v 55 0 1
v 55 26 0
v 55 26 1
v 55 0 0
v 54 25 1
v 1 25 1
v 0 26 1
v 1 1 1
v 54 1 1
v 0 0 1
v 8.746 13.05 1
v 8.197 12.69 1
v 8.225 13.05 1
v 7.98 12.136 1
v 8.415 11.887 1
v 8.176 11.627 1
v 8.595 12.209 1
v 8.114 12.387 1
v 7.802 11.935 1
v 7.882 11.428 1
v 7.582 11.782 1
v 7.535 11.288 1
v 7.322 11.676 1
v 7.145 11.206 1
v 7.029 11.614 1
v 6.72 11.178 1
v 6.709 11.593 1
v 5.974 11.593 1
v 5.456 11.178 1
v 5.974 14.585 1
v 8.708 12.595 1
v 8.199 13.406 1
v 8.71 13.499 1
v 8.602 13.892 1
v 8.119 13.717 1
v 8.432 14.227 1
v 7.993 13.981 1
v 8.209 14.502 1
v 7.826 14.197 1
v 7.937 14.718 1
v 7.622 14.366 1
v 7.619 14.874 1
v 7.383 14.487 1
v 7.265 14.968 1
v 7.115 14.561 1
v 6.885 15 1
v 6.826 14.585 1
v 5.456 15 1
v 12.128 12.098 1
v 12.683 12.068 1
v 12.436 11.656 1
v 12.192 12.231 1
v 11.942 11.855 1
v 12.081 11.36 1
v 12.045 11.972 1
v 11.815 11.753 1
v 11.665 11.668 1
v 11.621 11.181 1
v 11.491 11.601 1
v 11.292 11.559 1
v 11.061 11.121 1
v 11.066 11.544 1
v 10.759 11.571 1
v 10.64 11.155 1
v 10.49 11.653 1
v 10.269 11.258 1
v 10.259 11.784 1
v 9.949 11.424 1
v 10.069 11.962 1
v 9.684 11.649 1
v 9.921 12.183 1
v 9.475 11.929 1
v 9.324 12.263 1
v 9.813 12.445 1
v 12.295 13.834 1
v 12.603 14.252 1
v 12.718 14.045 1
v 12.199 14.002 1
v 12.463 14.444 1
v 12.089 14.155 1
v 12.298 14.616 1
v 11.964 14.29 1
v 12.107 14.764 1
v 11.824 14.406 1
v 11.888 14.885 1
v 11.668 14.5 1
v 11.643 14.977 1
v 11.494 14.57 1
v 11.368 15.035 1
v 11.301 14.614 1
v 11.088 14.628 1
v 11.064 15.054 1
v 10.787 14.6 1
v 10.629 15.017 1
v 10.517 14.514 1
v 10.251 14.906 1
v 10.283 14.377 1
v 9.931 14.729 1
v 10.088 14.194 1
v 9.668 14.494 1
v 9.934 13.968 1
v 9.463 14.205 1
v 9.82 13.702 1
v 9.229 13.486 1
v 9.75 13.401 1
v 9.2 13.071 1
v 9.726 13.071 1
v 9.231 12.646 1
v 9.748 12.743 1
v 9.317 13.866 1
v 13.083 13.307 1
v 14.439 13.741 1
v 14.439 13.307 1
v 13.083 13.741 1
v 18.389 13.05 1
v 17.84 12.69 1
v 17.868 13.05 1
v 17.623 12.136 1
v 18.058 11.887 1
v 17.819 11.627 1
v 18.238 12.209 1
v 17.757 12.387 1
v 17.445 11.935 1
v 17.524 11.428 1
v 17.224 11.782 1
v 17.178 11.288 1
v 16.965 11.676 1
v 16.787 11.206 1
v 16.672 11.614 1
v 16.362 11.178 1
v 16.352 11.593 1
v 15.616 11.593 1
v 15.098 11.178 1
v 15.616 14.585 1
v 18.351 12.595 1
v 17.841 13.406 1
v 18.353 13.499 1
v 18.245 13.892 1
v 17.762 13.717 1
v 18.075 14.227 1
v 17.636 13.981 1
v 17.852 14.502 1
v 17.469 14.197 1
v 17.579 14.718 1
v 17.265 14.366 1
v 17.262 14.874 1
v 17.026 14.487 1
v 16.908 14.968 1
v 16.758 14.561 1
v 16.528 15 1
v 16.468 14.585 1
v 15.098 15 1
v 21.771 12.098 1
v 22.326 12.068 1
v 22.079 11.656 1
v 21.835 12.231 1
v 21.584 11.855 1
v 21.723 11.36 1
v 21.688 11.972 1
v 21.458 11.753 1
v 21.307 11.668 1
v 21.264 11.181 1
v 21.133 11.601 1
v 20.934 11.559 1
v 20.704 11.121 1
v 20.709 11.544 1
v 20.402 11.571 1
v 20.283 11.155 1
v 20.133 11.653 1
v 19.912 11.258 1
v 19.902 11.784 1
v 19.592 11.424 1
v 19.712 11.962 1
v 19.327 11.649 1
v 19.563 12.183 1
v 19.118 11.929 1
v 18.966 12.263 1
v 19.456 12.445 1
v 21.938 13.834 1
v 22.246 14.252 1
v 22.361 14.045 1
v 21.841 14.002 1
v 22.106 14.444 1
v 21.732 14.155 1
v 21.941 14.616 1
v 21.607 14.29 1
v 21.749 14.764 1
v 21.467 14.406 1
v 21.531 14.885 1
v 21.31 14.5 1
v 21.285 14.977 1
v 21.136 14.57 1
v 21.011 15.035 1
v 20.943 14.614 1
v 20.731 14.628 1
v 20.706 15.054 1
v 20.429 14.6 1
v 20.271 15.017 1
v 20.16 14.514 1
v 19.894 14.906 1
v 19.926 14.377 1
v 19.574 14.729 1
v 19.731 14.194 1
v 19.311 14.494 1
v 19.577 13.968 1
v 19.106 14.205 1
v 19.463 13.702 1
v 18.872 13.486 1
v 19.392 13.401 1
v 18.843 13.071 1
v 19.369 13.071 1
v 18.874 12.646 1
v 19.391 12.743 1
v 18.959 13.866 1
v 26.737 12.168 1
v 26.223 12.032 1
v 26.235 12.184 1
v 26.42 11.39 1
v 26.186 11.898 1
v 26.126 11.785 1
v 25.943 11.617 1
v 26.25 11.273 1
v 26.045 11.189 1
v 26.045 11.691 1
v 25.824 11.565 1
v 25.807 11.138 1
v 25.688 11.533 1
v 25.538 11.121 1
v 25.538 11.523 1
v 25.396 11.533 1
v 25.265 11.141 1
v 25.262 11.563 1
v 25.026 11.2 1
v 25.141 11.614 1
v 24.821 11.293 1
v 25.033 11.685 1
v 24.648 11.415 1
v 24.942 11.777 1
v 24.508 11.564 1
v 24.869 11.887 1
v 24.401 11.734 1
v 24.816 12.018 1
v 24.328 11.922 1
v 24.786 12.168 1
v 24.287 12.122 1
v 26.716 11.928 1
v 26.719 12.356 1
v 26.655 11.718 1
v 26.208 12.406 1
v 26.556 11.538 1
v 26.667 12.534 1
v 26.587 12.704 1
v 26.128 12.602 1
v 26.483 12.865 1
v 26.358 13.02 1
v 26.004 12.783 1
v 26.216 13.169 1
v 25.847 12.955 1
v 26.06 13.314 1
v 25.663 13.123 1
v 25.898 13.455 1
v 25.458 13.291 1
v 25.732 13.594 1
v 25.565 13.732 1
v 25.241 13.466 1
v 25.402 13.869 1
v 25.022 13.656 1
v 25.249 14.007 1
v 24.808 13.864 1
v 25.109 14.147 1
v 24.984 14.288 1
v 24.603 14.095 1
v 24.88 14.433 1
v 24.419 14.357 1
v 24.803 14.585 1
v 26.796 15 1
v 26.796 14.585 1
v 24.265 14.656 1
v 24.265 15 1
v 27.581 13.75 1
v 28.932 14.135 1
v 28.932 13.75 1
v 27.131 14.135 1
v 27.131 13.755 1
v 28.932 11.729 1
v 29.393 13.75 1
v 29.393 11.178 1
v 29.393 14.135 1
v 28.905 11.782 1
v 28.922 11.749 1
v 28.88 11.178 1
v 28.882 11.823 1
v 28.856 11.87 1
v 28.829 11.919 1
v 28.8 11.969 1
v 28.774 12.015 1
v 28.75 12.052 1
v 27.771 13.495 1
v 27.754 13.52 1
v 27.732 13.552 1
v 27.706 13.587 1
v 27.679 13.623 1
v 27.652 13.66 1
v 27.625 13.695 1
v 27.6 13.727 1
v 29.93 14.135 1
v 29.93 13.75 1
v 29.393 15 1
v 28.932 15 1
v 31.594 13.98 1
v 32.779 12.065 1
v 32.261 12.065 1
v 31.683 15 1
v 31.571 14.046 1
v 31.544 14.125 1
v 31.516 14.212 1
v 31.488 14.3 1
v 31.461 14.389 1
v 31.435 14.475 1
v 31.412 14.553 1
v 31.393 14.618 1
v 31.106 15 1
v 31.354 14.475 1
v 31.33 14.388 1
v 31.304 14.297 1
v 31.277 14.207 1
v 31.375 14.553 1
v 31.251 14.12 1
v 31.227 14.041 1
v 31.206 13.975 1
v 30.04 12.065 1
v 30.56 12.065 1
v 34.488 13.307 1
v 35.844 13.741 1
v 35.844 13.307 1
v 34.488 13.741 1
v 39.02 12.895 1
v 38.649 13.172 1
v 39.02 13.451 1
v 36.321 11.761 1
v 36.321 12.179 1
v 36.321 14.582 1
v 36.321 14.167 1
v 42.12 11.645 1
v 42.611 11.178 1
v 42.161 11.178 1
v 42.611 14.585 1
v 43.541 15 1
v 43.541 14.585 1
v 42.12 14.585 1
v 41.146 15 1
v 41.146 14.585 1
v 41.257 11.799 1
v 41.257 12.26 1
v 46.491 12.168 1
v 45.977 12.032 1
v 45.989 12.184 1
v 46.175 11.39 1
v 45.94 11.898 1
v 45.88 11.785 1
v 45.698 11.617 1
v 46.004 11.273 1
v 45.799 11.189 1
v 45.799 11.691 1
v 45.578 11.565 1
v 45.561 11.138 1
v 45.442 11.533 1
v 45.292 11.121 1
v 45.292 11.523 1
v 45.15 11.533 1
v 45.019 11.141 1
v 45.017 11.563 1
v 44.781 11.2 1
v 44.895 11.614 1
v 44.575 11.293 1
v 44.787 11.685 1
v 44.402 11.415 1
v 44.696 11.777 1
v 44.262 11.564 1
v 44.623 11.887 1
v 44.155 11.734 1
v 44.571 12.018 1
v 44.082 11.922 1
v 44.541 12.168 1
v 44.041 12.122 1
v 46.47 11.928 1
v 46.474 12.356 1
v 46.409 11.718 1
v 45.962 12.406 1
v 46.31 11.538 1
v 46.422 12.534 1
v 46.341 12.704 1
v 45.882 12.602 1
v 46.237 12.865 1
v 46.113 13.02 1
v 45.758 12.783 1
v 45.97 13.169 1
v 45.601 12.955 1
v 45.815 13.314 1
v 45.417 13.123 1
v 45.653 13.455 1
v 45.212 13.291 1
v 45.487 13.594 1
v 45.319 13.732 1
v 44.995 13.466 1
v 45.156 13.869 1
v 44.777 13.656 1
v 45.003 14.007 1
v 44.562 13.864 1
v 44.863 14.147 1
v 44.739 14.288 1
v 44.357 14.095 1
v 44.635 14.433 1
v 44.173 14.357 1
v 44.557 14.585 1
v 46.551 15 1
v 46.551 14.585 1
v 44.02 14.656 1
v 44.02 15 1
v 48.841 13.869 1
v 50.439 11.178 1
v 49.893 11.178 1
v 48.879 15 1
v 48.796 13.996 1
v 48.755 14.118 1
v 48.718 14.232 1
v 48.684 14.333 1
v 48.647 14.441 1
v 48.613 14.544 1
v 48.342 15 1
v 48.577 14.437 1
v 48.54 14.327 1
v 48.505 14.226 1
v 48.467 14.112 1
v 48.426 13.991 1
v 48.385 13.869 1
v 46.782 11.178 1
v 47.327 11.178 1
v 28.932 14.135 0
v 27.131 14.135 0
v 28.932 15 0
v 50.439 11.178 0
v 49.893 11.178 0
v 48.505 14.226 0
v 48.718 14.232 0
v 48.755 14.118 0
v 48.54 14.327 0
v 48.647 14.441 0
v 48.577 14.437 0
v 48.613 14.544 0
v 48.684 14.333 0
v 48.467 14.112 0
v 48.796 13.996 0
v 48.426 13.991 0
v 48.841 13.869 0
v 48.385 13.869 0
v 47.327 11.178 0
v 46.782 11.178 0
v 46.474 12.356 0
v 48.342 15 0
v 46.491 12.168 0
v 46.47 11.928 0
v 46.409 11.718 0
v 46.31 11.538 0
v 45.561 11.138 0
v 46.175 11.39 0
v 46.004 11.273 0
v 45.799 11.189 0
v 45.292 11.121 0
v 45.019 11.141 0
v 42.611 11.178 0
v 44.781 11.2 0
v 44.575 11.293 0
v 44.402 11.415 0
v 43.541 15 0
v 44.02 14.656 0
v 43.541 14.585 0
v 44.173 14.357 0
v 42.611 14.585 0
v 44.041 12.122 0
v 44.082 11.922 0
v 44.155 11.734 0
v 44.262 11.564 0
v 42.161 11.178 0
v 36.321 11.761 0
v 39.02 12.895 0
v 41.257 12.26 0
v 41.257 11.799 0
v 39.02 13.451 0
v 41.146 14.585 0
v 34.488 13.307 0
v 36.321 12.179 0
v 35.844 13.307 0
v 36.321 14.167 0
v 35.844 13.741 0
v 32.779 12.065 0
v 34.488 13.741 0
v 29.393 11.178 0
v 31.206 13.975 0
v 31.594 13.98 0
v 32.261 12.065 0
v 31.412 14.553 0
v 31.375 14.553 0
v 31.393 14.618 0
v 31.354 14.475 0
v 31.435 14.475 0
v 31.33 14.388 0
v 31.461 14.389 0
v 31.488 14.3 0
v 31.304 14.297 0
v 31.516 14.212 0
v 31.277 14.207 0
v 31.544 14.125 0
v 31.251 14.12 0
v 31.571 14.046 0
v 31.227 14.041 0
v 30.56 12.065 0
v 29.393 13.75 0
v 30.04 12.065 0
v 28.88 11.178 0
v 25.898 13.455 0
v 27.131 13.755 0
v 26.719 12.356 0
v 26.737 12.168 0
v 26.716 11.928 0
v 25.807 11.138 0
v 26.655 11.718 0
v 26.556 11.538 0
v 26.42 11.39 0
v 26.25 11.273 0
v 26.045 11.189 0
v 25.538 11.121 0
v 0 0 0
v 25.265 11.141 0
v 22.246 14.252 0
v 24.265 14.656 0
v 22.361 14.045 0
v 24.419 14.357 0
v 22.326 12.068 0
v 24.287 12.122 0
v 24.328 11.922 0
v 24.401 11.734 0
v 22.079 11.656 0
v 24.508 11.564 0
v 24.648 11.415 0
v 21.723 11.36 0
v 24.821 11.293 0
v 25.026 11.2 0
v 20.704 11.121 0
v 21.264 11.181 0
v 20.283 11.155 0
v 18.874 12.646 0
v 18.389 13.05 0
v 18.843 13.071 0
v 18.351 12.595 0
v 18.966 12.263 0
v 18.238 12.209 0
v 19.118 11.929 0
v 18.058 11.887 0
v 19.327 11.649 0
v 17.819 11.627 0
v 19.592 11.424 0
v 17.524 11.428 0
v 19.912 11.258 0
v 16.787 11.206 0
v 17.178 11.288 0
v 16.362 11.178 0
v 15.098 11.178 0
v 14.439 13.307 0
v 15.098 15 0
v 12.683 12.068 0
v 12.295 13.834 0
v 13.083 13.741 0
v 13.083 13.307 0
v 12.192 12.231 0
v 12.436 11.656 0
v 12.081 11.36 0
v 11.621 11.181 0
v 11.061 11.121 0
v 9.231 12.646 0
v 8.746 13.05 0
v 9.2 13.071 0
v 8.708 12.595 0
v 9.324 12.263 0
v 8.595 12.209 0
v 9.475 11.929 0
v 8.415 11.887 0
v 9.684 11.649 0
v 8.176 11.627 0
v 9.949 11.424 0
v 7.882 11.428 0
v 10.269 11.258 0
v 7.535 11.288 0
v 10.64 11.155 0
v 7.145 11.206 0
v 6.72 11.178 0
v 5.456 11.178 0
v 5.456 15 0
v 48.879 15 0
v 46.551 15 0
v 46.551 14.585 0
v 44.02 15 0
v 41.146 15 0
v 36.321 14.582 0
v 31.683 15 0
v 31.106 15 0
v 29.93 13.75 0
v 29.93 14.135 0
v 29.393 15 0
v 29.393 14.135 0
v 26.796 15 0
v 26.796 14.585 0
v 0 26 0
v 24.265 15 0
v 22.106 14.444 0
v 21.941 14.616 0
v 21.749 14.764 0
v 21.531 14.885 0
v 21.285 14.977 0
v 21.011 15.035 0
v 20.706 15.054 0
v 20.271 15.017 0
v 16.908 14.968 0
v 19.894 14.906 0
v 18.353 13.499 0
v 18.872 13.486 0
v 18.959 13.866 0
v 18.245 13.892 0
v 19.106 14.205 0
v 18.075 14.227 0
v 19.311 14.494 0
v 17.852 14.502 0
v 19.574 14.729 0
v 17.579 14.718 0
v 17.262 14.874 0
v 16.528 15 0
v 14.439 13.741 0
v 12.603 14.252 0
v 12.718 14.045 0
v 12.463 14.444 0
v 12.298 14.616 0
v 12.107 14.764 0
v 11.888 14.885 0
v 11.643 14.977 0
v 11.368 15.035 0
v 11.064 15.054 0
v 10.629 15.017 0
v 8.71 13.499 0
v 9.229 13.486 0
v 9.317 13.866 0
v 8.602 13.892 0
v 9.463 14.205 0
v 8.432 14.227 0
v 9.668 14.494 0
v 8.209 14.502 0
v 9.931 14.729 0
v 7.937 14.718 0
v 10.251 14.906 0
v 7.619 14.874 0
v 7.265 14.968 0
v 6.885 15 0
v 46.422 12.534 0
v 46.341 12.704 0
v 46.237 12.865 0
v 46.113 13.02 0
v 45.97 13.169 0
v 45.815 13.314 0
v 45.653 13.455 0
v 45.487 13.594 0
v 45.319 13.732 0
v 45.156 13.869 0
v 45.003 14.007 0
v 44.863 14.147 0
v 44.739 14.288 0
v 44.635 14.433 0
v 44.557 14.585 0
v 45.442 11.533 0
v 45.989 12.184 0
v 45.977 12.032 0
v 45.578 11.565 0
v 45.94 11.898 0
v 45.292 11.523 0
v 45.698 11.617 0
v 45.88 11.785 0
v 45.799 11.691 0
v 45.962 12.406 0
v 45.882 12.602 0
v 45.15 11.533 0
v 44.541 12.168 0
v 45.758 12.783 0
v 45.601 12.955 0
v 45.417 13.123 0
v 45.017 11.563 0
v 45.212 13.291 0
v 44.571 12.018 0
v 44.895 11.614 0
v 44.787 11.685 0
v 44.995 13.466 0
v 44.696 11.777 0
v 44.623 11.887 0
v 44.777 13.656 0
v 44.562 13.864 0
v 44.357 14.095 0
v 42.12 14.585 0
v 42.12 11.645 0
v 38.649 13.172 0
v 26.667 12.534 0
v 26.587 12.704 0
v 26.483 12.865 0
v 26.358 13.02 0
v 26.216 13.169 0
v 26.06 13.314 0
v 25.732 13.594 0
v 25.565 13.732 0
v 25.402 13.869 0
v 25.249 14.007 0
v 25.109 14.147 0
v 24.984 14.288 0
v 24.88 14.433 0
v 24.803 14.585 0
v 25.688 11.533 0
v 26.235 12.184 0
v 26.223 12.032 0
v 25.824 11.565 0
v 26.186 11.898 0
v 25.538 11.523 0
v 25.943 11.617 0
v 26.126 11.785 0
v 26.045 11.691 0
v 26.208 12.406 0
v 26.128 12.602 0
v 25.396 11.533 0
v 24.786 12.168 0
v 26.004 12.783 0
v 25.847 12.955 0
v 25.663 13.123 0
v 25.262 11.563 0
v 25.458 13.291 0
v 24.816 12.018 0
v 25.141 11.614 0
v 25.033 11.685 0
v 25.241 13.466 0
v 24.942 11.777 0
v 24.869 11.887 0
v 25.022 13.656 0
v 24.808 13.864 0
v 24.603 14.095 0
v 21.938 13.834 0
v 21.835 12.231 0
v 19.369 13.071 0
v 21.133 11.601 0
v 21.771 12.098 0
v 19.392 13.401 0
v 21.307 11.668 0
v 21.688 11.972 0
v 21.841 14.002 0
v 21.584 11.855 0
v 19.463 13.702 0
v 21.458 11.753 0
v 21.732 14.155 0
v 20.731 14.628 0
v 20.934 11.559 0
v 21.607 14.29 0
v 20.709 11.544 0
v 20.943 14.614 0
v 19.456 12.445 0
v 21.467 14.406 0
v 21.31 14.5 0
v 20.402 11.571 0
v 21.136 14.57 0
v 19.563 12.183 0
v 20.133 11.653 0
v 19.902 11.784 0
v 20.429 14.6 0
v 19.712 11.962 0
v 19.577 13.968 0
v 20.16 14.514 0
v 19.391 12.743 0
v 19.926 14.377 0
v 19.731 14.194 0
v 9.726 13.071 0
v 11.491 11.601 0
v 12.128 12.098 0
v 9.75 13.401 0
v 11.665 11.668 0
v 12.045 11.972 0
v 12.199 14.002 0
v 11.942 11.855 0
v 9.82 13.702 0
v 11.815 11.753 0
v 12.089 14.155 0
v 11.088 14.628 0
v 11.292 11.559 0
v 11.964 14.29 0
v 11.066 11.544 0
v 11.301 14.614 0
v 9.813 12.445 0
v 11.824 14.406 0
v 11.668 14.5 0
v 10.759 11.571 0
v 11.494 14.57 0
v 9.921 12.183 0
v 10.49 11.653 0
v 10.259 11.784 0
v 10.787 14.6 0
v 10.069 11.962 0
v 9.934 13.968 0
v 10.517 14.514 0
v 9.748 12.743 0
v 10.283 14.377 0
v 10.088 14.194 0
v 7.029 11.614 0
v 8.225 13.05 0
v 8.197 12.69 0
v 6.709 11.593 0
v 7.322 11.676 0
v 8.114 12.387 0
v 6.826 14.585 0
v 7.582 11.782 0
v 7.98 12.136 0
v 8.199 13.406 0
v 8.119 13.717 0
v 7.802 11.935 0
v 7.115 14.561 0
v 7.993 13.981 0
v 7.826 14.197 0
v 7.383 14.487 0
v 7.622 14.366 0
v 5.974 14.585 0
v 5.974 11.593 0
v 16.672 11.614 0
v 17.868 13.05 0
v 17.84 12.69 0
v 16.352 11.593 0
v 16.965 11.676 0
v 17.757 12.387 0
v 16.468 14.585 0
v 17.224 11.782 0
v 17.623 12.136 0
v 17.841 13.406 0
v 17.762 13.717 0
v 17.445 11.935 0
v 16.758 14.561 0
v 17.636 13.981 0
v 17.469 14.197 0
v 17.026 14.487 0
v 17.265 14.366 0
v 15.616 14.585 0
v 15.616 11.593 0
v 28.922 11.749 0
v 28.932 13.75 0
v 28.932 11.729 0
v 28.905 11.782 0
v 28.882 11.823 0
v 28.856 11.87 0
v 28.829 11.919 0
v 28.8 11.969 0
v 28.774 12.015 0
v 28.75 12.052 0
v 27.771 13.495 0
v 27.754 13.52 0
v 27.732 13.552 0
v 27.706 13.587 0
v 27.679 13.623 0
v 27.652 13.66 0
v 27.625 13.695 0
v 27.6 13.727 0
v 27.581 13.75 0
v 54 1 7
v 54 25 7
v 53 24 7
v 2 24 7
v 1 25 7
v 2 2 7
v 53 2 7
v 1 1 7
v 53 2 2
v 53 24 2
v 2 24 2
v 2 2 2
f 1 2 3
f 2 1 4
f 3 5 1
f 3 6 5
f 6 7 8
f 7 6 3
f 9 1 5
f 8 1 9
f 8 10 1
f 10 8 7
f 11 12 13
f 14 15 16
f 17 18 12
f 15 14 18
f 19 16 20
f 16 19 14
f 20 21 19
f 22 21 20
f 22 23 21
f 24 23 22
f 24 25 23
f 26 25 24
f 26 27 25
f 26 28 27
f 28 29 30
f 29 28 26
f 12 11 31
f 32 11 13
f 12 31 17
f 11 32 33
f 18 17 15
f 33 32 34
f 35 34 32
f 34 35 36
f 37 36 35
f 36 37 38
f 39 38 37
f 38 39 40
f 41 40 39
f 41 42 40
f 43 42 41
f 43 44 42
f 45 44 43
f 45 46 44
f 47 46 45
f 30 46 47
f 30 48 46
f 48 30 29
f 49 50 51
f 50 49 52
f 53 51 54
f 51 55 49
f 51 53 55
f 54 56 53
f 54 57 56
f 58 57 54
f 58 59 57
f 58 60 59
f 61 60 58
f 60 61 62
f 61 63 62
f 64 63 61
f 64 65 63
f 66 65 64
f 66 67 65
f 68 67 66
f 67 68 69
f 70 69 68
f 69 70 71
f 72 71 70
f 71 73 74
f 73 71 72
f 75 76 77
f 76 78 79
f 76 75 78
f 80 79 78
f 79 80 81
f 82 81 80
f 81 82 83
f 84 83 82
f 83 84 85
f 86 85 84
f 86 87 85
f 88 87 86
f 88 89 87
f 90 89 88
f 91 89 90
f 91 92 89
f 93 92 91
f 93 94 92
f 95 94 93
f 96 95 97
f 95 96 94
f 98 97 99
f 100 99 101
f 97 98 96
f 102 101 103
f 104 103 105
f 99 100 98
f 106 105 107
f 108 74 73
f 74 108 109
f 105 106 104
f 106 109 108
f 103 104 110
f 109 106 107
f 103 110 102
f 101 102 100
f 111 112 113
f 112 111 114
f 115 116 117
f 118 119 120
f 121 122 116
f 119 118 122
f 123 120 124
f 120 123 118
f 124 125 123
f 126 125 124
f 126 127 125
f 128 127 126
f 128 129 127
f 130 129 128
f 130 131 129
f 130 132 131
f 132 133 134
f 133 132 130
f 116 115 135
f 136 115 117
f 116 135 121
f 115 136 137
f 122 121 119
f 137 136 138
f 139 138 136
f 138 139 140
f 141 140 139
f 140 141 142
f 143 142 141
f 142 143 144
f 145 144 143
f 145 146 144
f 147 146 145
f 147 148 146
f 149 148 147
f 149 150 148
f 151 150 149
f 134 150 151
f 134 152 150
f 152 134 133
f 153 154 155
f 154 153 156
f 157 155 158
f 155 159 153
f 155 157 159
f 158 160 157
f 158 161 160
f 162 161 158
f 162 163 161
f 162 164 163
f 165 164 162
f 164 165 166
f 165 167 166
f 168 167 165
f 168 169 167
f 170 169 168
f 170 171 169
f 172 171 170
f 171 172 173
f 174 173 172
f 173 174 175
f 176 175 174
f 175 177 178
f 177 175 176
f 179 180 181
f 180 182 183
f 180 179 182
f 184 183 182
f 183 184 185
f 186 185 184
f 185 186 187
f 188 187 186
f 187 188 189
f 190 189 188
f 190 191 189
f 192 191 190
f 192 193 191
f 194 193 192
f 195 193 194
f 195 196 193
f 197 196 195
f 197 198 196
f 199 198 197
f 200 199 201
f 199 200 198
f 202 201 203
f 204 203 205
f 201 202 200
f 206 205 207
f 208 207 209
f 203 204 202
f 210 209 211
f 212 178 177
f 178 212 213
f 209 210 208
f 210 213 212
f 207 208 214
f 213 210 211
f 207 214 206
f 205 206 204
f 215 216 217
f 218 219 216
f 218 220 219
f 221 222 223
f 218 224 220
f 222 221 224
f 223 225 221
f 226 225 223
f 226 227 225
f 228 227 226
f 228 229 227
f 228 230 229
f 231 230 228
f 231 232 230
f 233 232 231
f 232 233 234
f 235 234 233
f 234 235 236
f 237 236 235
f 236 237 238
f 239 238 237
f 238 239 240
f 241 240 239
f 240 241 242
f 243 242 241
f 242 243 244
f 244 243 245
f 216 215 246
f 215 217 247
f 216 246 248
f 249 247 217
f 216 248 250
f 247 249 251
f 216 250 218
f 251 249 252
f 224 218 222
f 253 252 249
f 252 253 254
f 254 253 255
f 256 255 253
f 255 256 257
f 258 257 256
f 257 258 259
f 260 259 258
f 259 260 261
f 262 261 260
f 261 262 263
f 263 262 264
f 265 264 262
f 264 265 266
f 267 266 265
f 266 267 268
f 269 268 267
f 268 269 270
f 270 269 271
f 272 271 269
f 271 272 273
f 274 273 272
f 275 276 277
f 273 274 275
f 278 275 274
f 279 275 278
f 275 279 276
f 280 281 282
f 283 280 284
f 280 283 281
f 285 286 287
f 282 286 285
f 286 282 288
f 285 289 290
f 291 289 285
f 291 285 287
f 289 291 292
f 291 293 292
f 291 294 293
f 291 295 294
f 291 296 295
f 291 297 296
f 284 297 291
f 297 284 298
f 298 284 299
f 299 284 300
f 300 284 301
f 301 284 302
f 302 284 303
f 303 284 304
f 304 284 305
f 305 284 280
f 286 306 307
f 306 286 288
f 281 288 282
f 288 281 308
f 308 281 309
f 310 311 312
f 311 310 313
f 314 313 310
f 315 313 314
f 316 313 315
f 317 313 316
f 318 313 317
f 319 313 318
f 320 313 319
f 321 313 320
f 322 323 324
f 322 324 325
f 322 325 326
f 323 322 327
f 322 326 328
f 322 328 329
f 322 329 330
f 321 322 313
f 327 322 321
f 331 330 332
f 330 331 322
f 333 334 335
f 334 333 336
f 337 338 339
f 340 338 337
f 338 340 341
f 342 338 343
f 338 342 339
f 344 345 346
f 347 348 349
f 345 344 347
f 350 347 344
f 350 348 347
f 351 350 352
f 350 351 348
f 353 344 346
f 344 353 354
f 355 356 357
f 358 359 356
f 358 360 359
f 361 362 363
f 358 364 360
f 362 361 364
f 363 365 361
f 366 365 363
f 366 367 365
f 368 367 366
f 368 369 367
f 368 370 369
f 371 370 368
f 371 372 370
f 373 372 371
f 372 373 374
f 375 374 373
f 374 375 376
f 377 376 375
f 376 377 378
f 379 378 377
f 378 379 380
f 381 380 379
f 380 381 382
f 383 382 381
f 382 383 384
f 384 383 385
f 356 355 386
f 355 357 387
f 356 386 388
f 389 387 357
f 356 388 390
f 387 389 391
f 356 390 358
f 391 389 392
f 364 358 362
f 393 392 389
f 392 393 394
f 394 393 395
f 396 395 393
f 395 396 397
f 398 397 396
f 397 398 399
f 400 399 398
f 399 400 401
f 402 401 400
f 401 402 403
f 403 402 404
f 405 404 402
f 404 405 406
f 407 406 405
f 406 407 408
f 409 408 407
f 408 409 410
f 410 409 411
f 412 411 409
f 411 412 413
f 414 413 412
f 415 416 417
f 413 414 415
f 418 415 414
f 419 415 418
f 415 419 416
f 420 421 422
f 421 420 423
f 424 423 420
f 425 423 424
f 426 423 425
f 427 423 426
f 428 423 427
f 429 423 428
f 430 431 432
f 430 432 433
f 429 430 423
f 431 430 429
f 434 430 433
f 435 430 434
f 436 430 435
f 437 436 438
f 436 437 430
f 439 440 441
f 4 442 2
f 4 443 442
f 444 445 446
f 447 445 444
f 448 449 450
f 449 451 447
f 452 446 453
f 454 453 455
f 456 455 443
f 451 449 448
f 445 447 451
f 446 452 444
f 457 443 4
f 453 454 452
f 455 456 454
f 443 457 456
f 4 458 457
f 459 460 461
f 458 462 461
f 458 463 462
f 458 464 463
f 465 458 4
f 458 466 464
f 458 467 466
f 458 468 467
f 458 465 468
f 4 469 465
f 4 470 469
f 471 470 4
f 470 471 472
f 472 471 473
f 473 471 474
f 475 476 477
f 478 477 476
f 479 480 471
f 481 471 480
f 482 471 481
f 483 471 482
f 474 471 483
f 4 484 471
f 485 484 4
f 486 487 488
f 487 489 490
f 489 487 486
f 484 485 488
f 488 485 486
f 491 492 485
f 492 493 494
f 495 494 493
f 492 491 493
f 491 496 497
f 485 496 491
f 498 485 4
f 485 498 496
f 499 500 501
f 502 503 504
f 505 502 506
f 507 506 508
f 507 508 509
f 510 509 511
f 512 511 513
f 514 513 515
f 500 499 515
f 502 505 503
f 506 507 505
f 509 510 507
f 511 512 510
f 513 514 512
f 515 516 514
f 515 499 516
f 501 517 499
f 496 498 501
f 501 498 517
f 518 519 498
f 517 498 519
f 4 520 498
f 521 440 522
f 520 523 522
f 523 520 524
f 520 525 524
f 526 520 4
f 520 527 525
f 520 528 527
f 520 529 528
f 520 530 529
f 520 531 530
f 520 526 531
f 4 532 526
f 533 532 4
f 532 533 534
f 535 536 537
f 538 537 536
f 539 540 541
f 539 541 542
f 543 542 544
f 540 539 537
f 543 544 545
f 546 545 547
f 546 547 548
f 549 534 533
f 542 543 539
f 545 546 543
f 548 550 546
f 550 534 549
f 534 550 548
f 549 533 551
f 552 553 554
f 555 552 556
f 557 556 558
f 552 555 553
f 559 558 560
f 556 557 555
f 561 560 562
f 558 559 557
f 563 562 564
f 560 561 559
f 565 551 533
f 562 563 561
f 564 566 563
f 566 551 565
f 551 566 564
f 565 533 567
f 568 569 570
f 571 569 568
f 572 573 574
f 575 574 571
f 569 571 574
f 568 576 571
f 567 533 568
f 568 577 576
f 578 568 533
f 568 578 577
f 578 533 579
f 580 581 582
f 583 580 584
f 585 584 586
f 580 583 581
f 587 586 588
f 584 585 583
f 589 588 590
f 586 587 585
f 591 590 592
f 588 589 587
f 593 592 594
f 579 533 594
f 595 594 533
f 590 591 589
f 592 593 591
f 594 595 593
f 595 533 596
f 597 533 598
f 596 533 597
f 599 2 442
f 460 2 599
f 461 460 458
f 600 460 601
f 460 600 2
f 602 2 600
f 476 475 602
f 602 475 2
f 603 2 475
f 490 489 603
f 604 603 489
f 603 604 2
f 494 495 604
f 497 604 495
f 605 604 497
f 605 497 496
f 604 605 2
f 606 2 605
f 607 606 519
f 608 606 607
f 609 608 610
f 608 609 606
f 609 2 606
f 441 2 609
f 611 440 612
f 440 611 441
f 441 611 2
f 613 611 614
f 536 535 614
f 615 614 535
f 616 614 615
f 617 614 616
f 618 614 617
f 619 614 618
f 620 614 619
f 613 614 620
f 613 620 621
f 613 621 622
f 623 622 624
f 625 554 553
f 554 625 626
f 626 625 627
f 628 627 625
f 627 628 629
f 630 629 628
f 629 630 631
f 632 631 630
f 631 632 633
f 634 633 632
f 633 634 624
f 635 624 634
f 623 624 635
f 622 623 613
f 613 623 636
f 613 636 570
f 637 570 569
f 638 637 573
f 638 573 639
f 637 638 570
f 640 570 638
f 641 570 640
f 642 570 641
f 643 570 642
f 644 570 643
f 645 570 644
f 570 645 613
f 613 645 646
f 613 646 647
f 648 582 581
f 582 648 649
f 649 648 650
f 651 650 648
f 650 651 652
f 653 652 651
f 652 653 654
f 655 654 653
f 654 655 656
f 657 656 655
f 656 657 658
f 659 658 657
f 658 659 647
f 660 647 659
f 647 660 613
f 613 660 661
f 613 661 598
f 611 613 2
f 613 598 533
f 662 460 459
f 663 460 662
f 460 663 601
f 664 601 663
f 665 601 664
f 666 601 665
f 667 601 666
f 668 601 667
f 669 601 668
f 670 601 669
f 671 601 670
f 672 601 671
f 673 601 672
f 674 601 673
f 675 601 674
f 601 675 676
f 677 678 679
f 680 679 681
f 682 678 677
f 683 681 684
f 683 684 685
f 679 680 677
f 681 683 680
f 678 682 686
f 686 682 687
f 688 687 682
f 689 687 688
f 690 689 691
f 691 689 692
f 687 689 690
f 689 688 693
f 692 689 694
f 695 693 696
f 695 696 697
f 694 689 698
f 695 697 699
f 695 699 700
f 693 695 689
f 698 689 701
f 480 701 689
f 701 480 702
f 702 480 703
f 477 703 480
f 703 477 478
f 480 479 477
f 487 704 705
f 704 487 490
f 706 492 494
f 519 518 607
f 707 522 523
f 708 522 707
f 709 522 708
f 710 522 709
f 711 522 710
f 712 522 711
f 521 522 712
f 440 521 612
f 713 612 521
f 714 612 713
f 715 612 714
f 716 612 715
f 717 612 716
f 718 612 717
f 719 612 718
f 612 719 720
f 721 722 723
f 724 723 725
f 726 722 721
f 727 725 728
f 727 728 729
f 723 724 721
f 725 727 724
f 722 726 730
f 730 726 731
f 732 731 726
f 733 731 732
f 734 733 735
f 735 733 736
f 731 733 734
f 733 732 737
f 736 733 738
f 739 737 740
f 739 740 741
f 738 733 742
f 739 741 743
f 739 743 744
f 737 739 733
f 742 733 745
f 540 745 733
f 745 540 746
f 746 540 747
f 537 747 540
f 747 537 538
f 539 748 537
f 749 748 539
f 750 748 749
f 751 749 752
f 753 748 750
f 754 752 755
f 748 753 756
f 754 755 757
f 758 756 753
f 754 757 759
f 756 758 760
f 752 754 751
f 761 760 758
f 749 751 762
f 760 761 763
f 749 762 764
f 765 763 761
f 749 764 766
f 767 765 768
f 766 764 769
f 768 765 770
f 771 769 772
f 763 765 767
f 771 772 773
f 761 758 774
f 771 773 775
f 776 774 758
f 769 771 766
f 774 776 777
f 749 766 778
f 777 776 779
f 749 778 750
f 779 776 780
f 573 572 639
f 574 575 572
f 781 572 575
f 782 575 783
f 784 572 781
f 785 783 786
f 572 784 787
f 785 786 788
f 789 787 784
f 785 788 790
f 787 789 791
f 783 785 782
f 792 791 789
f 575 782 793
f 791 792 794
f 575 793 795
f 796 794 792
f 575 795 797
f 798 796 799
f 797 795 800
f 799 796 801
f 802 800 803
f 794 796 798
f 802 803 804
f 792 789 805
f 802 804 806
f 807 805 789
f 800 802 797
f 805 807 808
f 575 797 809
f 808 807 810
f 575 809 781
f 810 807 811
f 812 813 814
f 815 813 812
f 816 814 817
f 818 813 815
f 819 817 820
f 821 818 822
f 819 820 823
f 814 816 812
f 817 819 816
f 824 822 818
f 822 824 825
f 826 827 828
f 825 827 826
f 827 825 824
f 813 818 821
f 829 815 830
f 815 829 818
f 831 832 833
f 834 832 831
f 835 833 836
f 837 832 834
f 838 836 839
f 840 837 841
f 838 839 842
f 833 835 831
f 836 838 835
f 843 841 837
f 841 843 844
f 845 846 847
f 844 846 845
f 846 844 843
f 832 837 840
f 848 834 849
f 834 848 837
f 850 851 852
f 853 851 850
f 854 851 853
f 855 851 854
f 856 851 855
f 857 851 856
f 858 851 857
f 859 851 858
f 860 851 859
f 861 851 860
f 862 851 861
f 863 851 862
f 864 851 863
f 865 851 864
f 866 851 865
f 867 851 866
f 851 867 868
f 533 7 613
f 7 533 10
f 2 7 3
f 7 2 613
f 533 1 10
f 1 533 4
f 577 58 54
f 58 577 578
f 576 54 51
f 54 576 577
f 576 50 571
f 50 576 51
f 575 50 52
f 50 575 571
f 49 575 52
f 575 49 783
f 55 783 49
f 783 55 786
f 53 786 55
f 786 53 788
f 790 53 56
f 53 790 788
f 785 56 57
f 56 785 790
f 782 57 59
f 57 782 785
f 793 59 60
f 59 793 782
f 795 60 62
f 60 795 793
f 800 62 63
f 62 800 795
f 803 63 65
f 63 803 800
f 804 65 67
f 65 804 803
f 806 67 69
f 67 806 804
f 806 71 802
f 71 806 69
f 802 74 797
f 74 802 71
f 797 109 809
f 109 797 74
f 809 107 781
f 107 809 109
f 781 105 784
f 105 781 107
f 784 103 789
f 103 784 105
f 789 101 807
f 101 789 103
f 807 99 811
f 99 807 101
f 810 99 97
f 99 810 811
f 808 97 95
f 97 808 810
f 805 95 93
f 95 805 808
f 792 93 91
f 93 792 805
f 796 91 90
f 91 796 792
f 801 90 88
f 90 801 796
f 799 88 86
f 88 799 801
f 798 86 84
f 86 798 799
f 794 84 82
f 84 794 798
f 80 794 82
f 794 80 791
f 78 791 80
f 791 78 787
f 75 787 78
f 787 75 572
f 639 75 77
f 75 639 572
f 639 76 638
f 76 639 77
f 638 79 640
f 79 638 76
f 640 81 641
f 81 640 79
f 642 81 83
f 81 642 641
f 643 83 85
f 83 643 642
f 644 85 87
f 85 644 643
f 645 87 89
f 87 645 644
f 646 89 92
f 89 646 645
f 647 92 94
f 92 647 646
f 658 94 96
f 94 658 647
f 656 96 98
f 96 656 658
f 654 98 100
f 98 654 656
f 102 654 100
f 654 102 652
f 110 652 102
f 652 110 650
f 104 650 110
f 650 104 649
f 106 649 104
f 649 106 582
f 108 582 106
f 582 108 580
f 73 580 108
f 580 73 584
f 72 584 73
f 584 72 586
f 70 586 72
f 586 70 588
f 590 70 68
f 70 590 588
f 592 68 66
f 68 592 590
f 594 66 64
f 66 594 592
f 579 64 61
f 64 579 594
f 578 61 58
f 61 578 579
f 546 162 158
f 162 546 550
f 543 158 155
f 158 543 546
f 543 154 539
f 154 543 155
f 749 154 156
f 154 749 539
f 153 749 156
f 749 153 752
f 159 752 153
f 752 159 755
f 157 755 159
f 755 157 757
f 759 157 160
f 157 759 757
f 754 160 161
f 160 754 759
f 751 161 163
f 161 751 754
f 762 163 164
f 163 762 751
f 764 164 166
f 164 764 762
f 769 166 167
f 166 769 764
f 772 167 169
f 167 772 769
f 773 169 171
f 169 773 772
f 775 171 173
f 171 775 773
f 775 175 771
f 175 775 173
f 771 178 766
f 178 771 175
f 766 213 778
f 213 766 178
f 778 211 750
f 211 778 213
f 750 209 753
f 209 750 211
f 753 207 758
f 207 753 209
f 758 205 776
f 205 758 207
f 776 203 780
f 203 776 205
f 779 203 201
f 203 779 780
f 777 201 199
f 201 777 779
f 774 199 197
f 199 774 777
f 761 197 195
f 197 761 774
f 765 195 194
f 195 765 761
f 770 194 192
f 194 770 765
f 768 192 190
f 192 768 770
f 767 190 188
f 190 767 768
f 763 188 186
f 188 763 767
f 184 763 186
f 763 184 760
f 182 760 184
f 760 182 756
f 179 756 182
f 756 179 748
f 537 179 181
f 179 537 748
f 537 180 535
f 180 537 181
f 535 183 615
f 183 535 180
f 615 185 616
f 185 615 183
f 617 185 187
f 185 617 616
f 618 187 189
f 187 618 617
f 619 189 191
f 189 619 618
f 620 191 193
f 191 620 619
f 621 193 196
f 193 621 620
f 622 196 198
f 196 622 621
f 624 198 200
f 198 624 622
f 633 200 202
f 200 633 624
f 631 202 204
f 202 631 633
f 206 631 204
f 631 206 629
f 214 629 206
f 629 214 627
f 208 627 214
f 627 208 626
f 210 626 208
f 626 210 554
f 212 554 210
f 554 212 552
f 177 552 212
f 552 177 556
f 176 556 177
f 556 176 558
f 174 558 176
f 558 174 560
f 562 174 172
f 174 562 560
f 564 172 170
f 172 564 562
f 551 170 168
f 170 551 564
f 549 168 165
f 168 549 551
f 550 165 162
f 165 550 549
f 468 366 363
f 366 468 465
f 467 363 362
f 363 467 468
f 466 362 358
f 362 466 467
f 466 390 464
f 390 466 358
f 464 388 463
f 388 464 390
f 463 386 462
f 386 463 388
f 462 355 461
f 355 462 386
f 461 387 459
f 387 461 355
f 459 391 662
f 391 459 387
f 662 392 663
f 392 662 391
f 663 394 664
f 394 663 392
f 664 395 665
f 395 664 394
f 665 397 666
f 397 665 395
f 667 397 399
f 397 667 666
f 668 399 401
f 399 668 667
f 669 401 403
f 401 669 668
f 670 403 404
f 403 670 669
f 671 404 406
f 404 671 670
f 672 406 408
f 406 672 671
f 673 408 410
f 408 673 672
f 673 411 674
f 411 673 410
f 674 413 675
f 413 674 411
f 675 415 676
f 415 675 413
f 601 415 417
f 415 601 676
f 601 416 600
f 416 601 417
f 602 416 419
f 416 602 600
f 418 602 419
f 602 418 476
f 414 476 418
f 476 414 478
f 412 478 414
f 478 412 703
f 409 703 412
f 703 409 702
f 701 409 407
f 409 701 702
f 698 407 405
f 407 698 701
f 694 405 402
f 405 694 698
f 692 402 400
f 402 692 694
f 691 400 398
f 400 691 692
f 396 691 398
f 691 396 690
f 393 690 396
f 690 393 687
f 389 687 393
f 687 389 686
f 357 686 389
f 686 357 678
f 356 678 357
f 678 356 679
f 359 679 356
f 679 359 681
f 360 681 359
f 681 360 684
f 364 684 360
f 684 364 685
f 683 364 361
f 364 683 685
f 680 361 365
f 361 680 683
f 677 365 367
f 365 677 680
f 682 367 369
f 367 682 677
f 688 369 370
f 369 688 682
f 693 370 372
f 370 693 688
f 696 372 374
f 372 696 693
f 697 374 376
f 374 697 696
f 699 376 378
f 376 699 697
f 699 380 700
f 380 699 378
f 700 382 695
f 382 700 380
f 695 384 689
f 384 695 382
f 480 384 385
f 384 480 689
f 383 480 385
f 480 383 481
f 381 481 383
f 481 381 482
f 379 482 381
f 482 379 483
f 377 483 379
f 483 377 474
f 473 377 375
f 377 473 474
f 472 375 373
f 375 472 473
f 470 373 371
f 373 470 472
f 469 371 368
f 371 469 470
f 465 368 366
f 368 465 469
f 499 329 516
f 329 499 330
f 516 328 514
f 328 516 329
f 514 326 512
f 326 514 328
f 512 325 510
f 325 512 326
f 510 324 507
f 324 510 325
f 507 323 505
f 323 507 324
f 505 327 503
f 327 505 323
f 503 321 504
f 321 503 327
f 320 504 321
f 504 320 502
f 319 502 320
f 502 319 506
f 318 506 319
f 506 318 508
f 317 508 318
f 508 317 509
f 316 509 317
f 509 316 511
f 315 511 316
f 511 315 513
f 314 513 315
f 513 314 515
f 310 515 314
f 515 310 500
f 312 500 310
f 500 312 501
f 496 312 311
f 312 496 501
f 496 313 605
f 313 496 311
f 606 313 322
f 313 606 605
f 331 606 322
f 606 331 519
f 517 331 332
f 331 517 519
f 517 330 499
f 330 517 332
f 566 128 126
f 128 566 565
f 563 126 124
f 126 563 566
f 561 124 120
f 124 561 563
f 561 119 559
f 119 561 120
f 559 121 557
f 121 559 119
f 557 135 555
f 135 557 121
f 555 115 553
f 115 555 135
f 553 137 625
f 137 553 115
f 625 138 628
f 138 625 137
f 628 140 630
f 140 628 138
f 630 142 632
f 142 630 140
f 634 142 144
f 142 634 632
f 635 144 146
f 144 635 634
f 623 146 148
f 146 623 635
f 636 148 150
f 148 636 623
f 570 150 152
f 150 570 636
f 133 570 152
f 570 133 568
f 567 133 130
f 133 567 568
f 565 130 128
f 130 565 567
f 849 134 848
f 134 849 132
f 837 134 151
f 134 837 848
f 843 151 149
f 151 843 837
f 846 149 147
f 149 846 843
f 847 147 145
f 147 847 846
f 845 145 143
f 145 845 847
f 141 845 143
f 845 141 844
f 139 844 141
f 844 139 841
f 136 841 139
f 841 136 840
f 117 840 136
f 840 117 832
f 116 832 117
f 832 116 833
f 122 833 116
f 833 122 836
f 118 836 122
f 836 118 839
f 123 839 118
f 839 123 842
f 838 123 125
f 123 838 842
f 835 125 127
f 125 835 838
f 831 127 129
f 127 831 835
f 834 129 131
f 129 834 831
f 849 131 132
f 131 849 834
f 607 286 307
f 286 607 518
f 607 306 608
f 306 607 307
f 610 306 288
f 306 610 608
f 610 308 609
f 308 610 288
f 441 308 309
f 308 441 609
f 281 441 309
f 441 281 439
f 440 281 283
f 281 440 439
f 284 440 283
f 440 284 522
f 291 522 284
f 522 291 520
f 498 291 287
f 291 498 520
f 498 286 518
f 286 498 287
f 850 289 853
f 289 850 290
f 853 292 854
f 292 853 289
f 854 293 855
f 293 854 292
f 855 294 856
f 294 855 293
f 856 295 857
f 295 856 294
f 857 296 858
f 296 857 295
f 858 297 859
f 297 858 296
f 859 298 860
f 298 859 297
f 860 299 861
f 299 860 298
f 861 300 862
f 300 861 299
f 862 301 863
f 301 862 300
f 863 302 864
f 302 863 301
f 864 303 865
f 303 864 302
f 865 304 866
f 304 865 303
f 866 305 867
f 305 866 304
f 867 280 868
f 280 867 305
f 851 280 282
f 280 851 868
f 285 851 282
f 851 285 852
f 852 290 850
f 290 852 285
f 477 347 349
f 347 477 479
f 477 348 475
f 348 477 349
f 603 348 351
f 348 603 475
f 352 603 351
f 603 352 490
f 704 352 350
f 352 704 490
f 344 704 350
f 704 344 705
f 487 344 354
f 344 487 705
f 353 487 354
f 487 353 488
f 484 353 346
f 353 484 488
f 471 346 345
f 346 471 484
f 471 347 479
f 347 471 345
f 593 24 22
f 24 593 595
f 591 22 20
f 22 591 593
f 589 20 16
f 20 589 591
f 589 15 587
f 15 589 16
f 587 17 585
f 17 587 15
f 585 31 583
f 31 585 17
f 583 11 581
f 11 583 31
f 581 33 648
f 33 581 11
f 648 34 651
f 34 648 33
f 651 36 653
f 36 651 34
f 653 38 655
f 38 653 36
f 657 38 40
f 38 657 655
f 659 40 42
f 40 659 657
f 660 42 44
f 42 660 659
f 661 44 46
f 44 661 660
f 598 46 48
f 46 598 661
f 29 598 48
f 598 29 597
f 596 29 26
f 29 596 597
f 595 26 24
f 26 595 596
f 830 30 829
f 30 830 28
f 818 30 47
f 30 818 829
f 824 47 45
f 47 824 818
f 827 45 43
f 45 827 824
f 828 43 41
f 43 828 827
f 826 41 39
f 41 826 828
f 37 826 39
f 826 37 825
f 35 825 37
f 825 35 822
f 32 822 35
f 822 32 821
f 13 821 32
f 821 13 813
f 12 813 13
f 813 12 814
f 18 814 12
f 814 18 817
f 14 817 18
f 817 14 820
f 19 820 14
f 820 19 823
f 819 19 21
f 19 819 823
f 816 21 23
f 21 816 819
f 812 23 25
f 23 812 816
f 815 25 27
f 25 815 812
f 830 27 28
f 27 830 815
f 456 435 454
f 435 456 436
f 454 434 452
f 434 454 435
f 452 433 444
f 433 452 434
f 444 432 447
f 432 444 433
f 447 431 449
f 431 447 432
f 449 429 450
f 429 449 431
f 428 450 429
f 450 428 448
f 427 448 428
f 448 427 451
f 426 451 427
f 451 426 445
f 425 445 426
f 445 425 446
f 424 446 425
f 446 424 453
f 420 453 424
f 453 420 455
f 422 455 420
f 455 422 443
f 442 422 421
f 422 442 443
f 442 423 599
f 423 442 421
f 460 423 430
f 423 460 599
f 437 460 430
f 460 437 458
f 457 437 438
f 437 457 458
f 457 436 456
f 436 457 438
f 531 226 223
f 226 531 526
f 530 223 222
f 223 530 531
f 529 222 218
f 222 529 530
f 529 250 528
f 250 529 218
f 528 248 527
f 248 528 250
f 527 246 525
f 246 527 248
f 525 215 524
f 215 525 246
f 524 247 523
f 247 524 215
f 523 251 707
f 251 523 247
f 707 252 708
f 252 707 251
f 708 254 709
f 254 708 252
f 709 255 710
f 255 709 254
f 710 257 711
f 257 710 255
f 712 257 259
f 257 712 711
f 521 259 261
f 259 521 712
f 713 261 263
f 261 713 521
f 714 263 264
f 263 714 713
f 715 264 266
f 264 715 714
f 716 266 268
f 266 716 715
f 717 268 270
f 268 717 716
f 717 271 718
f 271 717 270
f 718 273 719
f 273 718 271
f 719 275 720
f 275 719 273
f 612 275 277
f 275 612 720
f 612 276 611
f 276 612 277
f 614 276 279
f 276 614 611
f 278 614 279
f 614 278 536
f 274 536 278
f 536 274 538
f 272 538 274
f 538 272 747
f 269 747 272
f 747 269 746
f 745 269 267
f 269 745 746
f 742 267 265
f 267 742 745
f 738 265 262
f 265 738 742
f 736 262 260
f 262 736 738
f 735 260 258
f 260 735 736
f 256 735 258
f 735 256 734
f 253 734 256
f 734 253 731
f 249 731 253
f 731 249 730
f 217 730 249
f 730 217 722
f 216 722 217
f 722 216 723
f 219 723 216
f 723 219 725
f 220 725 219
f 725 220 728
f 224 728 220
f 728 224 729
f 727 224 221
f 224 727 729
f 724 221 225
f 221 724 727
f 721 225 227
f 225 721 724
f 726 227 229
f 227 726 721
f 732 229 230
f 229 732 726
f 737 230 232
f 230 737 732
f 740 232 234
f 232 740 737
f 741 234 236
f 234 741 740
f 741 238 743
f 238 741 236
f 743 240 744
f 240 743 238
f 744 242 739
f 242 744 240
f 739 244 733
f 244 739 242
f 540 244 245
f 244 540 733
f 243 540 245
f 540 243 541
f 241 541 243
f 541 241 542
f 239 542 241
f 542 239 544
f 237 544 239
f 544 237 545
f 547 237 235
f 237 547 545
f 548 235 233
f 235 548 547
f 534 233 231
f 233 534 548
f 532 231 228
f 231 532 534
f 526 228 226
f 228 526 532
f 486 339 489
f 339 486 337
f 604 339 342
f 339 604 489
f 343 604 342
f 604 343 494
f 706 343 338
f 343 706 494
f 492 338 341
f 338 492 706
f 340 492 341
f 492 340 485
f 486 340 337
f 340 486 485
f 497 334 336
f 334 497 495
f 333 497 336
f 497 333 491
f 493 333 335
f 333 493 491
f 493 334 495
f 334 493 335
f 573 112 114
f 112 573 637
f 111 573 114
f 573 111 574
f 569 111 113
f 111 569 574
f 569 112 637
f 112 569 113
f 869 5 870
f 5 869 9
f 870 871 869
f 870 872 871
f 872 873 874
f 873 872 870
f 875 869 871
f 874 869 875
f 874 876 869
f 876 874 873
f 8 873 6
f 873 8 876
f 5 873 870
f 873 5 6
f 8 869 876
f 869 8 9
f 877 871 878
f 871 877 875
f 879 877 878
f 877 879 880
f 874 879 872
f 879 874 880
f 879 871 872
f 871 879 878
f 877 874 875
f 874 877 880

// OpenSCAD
difference() {
    cube([55,26,1]);
    translate([5,15,0]) {
        linear_extrude(4) {
            rotate([180, 0, 0]) 

          text("DC-DC 24v -> 12V", size=4, direction = "ltr");
        
        }
    }
}
translate([1,1,1]) {
  difference() {
    cube([53,24,6]);
    translate([1,1,1]) {
      cube([51,22,5.5]);
    }
  }
}
